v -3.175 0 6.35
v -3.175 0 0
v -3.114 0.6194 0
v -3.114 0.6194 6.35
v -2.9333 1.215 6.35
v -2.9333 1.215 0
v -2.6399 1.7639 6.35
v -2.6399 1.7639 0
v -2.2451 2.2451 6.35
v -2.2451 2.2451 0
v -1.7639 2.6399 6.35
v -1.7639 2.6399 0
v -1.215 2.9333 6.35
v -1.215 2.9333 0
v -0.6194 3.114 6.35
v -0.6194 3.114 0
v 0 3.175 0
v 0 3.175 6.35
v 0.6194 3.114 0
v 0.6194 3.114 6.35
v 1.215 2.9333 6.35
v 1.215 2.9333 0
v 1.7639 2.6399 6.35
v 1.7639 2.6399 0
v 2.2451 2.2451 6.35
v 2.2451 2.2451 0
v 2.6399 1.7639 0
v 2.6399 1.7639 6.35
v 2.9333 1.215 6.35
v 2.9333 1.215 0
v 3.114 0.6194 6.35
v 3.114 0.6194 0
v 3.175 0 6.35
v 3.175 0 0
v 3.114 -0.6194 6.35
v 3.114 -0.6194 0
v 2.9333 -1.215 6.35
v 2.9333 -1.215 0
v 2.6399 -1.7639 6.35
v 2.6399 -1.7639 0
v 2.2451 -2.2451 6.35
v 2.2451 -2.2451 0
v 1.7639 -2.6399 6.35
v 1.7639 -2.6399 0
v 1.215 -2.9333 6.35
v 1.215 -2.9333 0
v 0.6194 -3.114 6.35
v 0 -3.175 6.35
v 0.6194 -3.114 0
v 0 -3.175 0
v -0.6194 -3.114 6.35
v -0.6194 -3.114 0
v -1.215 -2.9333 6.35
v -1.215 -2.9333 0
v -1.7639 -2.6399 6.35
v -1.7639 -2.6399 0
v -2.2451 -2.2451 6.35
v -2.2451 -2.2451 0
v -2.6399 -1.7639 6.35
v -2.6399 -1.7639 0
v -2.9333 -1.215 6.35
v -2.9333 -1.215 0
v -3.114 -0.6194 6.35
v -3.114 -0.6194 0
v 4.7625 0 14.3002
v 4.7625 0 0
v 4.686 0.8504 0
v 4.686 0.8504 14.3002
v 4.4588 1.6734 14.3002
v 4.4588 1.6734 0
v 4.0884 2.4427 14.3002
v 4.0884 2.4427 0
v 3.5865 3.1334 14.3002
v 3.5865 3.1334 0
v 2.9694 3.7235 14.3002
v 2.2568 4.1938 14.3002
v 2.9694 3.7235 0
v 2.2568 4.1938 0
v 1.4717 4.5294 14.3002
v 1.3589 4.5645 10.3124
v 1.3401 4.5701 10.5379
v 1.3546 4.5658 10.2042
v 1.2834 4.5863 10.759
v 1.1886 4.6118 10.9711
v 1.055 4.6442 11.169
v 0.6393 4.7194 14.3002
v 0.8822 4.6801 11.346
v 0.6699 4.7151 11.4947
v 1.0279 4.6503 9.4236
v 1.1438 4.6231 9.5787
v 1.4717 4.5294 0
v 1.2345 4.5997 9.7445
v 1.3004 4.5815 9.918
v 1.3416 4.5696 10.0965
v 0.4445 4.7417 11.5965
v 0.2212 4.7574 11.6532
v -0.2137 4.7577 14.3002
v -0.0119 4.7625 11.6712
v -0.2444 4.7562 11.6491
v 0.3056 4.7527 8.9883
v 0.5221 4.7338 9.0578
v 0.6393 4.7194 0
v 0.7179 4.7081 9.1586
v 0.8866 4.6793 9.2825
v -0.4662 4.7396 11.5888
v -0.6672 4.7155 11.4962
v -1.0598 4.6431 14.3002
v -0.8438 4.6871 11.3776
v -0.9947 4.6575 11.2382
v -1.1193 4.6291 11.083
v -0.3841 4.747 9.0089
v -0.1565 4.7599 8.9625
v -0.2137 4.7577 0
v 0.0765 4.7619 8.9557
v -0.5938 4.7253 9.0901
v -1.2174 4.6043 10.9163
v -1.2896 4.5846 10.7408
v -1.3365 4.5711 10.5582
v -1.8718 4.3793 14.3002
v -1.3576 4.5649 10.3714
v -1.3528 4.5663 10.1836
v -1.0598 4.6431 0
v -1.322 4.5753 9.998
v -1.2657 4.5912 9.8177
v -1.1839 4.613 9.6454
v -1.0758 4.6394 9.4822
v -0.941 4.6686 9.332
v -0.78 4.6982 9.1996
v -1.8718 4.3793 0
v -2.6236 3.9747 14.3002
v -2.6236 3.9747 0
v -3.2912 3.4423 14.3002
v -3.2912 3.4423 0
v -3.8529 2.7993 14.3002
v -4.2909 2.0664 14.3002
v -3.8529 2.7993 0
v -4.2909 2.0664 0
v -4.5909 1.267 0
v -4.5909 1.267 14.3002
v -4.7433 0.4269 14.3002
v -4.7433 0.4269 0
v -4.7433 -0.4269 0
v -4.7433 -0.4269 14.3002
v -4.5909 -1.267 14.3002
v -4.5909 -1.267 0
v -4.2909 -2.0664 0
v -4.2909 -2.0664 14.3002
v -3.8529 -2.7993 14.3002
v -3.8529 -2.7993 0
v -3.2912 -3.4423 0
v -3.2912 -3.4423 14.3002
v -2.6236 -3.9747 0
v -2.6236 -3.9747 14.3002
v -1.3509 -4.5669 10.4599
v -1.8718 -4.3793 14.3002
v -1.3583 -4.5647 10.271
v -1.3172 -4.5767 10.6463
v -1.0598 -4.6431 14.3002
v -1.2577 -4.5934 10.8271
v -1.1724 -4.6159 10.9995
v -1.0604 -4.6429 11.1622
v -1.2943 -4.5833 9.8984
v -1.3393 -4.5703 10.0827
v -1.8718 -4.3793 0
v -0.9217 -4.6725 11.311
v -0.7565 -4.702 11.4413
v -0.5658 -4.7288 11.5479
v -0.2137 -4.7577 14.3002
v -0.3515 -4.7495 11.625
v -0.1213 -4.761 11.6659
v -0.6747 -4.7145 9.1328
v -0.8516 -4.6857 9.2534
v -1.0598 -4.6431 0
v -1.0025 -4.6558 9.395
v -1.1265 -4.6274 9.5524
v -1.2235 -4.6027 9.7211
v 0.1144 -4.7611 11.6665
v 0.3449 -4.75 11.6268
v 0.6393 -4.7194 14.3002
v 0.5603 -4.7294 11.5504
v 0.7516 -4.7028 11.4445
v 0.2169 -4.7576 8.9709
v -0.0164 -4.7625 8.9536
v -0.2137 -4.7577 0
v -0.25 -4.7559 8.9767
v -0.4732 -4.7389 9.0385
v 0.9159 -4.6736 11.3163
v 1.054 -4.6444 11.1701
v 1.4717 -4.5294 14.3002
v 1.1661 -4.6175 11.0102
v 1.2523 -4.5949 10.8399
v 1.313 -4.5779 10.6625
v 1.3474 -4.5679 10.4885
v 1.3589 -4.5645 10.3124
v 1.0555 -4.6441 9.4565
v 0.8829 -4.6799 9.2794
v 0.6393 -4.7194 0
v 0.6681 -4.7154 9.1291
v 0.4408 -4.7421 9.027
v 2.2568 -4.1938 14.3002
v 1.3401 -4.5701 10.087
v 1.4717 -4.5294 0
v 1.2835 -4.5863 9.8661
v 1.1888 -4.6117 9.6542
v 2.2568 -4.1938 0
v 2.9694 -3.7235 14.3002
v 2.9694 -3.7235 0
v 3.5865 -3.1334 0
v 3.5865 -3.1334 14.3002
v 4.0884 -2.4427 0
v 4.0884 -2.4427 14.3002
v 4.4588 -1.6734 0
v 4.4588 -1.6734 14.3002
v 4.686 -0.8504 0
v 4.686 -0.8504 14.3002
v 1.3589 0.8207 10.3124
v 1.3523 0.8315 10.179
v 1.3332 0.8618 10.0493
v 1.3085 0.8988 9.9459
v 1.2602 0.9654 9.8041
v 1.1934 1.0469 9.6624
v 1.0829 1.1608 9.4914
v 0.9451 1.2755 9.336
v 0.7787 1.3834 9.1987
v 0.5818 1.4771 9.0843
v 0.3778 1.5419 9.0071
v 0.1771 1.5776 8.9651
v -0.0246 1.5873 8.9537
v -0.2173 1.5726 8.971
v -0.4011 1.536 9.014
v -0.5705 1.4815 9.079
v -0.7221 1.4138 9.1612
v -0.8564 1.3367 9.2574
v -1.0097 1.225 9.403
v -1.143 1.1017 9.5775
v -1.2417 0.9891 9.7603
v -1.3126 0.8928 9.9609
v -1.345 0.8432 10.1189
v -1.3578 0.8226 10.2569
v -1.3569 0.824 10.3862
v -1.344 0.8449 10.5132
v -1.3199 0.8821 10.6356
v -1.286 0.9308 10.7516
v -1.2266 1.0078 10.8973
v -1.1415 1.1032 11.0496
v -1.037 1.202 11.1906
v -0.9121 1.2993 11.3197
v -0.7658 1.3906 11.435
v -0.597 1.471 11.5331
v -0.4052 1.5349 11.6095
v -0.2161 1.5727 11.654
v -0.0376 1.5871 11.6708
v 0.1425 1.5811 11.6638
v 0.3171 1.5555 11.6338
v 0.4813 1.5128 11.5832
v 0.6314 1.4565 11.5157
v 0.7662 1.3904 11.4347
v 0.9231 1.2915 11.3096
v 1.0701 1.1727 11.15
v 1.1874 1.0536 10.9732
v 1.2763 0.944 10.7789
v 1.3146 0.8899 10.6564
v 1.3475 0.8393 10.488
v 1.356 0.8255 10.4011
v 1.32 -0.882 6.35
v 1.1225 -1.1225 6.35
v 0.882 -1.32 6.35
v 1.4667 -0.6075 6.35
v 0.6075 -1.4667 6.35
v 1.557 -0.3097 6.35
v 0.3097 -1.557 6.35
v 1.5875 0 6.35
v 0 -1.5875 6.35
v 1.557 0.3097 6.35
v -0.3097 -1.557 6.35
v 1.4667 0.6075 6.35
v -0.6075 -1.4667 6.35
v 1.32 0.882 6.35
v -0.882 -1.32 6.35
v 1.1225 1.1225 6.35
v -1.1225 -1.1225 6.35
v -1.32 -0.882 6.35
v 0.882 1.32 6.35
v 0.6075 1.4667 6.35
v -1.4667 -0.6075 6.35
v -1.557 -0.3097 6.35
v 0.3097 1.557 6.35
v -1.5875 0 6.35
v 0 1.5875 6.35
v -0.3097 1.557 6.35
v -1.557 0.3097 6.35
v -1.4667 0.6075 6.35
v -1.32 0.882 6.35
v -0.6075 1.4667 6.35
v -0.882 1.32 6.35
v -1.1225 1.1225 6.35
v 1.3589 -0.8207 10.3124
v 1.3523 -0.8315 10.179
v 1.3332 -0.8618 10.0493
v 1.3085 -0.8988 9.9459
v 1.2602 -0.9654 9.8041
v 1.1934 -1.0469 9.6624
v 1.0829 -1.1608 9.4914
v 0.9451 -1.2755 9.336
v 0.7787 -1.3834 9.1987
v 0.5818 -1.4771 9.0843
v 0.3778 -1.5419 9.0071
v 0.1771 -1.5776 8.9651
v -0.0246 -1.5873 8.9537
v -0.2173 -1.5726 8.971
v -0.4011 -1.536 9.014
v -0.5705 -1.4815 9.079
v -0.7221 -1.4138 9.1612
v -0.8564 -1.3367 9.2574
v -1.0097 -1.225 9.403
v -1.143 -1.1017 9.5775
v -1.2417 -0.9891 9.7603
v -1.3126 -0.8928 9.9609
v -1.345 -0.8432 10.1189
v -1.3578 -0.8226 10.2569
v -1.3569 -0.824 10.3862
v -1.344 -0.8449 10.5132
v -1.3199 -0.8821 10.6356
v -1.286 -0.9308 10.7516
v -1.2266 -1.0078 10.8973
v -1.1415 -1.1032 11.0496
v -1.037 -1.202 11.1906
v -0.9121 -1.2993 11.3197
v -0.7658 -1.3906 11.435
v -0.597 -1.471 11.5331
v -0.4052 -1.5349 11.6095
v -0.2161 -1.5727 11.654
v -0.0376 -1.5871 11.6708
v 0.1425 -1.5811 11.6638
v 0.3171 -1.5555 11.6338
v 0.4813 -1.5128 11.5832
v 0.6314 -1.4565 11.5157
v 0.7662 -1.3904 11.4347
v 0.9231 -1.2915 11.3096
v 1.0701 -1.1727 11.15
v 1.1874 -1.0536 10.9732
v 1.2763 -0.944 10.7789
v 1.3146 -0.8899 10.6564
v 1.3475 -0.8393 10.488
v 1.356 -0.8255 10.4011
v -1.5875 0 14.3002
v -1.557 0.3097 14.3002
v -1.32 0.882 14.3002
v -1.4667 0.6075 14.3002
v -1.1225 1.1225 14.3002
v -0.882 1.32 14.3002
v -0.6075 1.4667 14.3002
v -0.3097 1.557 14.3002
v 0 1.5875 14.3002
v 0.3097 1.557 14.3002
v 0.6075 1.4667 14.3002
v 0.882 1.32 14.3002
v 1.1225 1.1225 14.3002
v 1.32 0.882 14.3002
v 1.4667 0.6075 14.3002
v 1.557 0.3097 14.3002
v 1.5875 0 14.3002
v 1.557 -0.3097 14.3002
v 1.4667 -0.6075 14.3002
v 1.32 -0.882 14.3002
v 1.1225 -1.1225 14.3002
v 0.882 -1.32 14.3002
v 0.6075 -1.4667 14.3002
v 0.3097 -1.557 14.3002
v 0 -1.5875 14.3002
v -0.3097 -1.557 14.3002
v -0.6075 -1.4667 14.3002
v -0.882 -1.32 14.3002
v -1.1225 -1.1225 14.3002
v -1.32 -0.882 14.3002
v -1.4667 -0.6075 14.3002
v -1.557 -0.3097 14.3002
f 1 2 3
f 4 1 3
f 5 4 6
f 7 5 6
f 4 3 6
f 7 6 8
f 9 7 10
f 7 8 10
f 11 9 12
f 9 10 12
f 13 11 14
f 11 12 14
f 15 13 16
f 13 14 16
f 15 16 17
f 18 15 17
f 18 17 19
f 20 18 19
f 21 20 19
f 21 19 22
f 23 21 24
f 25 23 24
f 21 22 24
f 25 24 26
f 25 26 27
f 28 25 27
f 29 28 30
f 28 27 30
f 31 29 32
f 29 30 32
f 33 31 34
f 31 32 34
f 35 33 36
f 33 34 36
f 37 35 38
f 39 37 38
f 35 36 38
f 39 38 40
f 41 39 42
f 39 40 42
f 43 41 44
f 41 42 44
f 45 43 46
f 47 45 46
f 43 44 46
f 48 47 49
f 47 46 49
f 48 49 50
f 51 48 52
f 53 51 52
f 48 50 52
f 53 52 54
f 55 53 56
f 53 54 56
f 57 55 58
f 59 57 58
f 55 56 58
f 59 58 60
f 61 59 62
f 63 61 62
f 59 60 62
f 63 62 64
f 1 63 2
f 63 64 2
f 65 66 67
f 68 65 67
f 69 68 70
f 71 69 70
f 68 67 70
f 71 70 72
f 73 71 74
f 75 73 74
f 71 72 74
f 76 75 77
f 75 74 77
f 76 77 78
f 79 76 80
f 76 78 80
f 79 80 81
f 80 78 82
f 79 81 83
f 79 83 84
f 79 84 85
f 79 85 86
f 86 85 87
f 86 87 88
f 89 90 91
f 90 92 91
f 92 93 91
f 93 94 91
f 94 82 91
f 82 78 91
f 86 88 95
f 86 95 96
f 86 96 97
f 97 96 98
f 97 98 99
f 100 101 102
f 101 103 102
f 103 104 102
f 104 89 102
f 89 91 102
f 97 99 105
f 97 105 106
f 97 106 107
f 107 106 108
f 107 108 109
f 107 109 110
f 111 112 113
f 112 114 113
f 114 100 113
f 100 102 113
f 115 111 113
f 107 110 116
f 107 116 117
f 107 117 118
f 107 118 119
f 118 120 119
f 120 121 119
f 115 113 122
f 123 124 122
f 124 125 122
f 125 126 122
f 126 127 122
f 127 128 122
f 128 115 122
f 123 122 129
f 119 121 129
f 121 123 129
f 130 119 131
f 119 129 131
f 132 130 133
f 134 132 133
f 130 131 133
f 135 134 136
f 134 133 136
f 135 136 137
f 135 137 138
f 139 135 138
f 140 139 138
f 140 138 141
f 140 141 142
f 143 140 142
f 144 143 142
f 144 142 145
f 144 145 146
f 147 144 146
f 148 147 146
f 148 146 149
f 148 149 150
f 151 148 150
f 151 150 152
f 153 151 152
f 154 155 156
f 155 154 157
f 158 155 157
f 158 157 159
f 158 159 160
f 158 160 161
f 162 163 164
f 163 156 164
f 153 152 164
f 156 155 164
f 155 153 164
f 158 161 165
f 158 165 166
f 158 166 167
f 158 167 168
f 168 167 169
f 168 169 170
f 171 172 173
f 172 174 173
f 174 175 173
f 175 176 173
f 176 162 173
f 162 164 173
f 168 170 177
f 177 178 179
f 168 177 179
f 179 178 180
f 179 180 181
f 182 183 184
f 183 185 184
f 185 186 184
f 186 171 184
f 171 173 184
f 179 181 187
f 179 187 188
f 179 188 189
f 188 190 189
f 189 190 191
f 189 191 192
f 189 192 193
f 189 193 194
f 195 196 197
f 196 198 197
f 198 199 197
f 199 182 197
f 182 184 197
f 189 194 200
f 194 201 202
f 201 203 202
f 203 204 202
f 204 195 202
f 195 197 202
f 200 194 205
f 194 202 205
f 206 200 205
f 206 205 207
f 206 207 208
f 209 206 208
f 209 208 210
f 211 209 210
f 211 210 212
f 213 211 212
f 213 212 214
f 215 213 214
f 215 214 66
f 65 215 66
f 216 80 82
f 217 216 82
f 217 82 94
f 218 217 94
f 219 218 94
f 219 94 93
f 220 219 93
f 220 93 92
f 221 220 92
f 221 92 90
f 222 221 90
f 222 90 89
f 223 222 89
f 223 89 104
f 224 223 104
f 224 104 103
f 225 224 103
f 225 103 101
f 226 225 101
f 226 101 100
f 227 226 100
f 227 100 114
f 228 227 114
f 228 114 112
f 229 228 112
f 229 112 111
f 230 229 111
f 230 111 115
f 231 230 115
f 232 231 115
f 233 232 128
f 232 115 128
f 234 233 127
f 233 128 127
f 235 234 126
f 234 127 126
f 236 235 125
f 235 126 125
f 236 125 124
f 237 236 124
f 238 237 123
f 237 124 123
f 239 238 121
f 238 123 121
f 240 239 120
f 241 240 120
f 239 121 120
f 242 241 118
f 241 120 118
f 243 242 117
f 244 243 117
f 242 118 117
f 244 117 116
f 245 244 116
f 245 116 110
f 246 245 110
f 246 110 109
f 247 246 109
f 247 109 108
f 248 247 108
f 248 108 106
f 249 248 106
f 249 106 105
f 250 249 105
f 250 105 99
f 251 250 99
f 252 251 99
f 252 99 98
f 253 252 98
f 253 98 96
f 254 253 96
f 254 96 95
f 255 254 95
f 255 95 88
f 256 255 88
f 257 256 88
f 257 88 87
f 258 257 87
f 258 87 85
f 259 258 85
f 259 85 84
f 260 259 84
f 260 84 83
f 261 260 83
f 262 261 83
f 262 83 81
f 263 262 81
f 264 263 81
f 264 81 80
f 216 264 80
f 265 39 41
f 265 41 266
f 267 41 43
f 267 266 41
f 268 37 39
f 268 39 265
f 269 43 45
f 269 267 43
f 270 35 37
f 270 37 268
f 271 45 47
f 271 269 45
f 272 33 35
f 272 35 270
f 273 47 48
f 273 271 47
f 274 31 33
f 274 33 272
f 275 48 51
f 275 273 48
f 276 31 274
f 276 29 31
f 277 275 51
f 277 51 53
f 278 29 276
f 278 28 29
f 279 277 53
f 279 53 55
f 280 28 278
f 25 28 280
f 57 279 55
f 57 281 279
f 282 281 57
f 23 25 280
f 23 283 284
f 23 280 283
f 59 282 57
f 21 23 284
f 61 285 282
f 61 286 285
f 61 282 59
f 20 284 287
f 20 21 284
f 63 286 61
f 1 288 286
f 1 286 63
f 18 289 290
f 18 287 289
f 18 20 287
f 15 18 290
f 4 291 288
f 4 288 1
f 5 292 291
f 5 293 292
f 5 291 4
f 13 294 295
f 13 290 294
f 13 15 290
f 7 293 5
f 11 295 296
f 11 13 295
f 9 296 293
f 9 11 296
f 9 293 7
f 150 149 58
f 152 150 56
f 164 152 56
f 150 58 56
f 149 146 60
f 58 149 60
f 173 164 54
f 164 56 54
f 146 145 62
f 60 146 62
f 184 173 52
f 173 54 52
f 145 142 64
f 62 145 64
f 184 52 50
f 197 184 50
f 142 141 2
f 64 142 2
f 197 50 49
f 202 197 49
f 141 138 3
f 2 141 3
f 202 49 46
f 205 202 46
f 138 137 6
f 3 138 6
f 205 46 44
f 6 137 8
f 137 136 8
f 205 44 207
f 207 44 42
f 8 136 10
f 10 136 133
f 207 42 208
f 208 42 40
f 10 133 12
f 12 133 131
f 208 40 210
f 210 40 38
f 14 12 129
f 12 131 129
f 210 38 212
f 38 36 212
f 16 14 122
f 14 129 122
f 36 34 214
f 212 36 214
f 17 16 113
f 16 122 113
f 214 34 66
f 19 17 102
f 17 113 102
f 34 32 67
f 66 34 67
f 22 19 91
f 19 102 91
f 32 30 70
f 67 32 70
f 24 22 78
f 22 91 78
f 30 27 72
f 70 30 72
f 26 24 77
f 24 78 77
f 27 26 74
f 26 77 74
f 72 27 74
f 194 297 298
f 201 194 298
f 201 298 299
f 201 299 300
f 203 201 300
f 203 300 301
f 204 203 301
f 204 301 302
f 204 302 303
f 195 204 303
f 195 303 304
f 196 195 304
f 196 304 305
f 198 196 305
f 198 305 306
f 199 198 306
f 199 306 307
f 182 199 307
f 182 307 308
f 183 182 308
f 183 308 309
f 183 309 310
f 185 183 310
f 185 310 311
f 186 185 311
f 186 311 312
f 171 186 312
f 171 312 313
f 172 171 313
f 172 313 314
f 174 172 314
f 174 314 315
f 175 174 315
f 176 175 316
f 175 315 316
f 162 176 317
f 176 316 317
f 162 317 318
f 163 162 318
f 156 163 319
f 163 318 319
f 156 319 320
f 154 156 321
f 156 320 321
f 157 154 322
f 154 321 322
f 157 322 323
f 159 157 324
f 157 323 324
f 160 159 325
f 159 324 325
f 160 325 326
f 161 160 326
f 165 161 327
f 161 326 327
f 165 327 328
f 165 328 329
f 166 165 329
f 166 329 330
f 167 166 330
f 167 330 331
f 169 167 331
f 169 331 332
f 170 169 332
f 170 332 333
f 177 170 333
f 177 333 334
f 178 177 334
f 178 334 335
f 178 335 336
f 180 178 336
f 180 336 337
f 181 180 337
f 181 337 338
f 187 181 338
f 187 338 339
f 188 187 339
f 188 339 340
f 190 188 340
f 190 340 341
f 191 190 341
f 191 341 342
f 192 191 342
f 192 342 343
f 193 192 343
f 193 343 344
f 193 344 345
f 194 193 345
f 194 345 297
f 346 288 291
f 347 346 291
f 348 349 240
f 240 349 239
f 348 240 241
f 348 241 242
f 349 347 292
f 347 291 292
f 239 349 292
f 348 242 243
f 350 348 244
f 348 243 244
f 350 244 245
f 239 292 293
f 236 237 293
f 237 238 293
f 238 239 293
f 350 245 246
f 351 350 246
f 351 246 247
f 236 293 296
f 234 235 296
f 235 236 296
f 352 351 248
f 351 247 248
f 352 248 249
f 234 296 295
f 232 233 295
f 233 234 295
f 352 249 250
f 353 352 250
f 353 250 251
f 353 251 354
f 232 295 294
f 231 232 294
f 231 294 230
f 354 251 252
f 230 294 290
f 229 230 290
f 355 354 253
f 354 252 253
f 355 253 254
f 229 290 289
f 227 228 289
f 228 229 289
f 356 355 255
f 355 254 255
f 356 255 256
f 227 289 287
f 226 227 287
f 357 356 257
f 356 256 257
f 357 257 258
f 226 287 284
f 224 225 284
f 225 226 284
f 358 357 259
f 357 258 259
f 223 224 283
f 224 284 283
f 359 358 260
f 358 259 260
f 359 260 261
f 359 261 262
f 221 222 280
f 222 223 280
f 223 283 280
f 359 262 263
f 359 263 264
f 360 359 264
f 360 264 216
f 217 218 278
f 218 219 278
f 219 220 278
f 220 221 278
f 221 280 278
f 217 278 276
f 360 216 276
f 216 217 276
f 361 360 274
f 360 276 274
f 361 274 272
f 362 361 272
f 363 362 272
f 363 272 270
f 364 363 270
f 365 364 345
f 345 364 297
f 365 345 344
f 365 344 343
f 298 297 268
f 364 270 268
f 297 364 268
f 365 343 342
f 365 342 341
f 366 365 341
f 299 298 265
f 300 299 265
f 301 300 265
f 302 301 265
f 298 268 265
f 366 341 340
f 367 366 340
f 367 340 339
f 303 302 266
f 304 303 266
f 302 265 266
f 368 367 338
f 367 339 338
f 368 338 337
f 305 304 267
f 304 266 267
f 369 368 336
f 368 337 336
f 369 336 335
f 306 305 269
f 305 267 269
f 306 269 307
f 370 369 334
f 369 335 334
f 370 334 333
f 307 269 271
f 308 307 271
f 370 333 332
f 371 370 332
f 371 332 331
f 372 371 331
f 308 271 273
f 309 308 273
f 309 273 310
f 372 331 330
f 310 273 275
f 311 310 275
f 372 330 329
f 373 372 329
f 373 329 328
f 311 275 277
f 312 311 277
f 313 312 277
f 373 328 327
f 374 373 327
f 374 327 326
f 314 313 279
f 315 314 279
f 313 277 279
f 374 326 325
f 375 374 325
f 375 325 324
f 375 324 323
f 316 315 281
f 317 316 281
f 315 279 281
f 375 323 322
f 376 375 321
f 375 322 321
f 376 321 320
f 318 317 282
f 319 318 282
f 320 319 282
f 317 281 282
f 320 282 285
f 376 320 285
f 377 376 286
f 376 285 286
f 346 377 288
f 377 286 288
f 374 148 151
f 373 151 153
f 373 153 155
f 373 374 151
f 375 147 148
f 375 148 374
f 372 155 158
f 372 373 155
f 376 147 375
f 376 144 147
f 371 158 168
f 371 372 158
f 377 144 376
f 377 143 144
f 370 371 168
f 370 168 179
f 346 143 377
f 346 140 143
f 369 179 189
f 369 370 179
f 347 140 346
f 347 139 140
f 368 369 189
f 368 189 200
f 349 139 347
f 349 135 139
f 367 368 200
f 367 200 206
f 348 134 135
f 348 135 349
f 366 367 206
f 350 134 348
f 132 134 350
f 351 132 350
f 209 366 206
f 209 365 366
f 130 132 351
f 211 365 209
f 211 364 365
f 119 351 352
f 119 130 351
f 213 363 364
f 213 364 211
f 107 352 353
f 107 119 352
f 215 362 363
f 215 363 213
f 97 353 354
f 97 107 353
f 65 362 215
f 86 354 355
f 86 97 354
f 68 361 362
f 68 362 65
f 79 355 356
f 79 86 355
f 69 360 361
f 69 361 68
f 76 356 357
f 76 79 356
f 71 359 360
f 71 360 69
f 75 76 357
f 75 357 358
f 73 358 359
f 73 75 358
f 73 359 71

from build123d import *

# Parameters (mm, degrees)
SKETCH1_R           = 4.7625
BOSS_EXTRUDE1_DEPTH = 14.3002
SKETCH2_R           = 1.5875
CUT_EXTRUDE1_DEPTH  = 15.3002
SKETCH2_3_R         = 3.175
SKETCH2_3_R_2       = 1.5875
CUT_EXTRUDE2_DEPTH  = 6.35
SKETCH4_R           = 1.3589
CUT_EXTRUDE3_DEPTH  = 10.525


with BuildPart() as part:
    # Sketch1 → Boss-Extrude1 (new body)
    with BuildSketch(Plane.XY):
        Circle(SKETCH1_R)
    extrude(amount=BOSS_EXTRUDE1_DEPTH)

    # Sketch2 → Cut-Extrude1 (cut, through all)
    with BuildSketch(Plane(origin=(0, 0, 0), x_dir=(-1, 0, 0), z_dir=(0, 0, -1))):
        Circle(SKETCH2_R)
    extrude(amount=-CUT_EXTRUDE1_DEPTH, mode=Mode.SUBTRACT)

    # Sketch2<3> → Cut-Extrude2 (cut)
    with BuildSketch(Plane(origin=(0, 0, 0), x_dir=(-1, 0, 0), z_dir=(0, 0, -1))):
        Circle(SKETCH2_3_R)
        Circle(SKETCH2_3_R_2, mode=Mode.SUBTRACT)
    extrude(amount=-CUT_EXTRUDE2_DEPTH, mode=Mode.SUBTRACT)

    # Sketch4 → Cut-Extrude3 (cut, through all)
    with BuildSketch(Plane(origin=(0, 4.7625, 0), x_dir=(1, 0, 0), z_dir=(0, 1, 0))):
        with Locations((0, -10.3124)):
            Circle(SKETCH4_R)
    extrude(amount=-CUT_EXTRUDE3_DEPTH, mode=Mode.SUBTRACT)


solid = part.part
